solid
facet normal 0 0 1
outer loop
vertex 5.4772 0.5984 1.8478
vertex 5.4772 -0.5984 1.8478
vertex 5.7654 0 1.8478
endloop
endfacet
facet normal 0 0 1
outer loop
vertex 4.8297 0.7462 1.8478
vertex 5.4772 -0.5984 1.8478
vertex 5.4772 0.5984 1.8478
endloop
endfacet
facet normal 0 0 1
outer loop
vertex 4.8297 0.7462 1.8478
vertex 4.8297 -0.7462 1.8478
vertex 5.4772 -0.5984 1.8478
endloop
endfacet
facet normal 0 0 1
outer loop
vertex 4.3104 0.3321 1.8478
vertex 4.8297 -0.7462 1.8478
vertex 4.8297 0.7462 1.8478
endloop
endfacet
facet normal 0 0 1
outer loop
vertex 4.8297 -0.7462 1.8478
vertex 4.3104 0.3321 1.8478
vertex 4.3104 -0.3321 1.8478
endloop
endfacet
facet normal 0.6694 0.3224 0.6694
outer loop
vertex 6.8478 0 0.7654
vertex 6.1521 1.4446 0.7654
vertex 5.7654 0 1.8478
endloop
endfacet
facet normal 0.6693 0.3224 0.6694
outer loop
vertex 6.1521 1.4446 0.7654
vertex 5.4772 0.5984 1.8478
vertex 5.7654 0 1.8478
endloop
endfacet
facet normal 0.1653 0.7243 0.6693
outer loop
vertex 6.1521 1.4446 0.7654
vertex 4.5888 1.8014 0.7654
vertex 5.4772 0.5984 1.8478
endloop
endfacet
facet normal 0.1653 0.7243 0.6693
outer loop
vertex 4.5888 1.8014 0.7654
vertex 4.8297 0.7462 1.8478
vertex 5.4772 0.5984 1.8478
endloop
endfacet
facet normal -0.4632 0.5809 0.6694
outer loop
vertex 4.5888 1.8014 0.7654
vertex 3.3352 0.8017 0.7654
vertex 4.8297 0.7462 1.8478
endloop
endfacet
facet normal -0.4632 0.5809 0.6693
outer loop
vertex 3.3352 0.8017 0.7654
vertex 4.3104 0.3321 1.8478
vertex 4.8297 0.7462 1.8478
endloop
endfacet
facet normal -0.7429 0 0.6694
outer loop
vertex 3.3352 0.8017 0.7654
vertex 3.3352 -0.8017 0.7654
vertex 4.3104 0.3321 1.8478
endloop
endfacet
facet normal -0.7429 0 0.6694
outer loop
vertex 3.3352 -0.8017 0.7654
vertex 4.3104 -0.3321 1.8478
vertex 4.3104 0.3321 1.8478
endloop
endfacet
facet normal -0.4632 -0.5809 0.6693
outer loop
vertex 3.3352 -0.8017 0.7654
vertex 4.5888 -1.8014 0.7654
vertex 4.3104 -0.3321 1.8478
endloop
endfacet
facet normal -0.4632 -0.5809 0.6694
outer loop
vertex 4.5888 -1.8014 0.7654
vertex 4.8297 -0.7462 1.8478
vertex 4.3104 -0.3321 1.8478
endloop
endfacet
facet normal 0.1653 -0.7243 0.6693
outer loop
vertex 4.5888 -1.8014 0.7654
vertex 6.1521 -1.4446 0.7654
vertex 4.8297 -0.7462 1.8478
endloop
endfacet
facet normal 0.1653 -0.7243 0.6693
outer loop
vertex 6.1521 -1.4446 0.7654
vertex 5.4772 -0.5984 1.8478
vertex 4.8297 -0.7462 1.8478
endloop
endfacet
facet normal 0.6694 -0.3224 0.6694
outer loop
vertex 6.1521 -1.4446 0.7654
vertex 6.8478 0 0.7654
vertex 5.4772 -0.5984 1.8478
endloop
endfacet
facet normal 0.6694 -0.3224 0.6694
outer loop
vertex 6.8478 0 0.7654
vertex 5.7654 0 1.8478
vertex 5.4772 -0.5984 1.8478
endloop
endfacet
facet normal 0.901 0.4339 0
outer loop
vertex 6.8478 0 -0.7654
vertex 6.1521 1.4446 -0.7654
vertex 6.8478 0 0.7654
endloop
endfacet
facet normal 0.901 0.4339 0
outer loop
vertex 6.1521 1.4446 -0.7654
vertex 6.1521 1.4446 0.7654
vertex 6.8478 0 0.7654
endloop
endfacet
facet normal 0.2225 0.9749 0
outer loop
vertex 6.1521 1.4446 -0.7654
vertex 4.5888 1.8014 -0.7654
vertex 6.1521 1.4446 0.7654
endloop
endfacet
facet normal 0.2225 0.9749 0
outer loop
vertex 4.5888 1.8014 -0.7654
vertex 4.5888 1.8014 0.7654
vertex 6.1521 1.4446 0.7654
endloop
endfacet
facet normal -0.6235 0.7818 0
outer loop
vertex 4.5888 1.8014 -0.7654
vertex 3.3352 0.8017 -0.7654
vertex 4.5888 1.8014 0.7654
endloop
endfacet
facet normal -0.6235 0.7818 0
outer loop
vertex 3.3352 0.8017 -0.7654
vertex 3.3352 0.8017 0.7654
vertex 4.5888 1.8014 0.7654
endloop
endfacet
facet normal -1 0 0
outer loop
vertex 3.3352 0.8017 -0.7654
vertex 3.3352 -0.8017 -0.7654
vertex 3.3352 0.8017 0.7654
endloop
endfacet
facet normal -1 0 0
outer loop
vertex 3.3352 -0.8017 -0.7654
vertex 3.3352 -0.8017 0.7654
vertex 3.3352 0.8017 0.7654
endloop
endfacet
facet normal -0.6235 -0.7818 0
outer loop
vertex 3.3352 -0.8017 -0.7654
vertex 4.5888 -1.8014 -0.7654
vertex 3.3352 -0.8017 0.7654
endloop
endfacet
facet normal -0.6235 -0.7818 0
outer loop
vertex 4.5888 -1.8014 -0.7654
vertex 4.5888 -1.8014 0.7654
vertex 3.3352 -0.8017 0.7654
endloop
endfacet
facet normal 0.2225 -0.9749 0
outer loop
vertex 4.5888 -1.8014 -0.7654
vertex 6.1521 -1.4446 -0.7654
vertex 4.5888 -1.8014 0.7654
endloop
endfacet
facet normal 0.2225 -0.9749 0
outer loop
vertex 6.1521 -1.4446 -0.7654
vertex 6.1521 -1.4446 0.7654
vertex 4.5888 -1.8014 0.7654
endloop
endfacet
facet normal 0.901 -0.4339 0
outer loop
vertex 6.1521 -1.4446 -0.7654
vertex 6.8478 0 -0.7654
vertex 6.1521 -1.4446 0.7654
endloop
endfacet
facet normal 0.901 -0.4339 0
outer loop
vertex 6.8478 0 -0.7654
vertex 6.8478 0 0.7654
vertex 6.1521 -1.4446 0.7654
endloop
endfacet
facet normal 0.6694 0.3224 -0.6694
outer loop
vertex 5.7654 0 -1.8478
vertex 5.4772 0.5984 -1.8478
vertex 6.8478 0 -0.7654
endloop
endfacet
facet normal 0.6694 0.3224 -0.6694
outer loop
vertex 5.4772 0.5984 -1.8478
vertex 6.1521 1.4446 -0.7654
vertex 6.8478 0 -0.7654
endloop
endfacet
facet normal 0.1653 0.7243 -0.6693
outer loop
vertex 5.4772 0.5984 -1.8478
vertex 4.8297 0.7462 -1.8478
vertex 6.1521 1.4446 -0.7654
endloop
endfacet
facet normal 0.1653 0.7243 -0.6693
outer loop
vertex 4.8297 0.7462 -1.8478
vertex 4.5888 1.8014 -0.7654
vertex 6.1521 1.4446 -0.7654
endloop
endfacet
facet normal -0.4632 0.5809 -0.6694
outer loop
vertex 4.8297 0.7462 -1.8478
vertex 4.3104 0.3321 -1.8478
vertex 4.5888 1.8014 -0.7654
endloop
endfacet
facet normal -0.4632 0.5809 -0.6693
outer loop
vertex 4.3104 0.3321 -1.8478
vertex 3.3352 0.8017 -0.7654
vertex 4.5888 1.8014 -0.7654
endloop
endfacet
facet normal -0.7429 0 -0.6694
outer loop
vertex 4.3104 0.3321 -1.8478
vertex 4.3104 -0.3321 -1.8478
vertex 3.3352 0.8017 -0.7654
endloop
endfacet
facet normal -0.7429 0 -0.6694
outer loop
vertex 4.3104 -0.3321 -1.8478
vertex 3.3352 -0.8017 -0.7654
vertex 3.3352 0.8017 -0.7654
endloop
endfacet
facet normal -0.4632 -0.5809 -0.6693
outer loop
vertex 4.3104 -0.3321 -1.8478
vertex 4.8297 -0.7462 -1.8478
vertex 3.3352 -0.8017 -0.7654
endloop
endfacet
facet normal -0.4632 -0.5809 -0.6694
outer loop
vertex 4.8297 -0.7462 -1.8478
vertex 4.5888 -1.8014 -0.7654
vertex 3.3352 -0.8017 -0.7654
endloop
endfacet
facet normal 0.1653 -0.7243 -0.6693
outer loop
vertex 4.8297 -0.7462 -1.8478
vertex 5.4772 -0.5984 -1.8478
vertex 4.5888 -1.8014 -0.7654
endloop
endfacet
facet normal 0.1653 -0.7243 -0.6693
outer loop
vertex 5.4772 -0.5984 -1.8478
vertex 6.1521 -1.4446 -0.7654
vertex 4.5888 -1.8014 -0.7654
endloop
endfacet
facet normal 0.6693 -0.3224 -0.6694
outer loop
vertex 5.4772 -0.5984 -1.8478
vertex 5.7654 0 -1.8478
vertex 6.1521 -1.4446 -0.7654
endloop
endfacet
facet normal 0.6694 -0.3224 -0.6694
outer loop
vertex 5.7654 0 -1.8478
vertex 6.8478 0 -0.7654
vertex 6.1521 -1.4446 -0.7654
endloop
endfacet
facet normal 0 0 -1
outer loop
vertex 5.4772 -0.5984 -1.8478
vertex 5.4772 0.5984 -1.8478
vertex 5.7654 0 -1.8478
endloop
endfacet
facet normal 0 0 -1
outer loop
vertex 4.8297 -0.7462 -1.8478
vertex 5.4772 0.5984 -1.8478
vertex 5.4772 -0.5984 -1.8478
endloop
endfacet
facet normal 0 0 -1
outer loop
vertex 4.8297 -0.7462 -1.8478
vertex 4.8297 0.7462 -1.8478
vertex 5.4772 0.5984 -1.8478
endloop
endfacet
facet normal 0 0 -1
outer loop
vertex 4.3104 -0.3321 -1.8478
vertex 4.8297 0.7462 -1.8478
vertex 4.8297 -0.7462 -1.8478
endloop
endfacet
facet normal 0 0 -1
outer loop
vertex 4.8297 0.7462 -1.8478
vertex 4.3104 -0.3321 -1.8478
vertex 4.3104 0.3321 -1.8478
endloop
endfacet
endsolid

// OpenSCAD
// Modifier characters on module instantiations.
difference() {
    cube(10, center = true);
    #sphere(6);
}

%translate([0, 0, 10]) cube(2, center = true);

*cylinder(h = 100, r = 1);

union() {
    cube(1);
    !translate([5, 0, 0]) sphere(2);
}

#translate([0, 0, 5]) rotate([45, 0, 0]) cube(2);
